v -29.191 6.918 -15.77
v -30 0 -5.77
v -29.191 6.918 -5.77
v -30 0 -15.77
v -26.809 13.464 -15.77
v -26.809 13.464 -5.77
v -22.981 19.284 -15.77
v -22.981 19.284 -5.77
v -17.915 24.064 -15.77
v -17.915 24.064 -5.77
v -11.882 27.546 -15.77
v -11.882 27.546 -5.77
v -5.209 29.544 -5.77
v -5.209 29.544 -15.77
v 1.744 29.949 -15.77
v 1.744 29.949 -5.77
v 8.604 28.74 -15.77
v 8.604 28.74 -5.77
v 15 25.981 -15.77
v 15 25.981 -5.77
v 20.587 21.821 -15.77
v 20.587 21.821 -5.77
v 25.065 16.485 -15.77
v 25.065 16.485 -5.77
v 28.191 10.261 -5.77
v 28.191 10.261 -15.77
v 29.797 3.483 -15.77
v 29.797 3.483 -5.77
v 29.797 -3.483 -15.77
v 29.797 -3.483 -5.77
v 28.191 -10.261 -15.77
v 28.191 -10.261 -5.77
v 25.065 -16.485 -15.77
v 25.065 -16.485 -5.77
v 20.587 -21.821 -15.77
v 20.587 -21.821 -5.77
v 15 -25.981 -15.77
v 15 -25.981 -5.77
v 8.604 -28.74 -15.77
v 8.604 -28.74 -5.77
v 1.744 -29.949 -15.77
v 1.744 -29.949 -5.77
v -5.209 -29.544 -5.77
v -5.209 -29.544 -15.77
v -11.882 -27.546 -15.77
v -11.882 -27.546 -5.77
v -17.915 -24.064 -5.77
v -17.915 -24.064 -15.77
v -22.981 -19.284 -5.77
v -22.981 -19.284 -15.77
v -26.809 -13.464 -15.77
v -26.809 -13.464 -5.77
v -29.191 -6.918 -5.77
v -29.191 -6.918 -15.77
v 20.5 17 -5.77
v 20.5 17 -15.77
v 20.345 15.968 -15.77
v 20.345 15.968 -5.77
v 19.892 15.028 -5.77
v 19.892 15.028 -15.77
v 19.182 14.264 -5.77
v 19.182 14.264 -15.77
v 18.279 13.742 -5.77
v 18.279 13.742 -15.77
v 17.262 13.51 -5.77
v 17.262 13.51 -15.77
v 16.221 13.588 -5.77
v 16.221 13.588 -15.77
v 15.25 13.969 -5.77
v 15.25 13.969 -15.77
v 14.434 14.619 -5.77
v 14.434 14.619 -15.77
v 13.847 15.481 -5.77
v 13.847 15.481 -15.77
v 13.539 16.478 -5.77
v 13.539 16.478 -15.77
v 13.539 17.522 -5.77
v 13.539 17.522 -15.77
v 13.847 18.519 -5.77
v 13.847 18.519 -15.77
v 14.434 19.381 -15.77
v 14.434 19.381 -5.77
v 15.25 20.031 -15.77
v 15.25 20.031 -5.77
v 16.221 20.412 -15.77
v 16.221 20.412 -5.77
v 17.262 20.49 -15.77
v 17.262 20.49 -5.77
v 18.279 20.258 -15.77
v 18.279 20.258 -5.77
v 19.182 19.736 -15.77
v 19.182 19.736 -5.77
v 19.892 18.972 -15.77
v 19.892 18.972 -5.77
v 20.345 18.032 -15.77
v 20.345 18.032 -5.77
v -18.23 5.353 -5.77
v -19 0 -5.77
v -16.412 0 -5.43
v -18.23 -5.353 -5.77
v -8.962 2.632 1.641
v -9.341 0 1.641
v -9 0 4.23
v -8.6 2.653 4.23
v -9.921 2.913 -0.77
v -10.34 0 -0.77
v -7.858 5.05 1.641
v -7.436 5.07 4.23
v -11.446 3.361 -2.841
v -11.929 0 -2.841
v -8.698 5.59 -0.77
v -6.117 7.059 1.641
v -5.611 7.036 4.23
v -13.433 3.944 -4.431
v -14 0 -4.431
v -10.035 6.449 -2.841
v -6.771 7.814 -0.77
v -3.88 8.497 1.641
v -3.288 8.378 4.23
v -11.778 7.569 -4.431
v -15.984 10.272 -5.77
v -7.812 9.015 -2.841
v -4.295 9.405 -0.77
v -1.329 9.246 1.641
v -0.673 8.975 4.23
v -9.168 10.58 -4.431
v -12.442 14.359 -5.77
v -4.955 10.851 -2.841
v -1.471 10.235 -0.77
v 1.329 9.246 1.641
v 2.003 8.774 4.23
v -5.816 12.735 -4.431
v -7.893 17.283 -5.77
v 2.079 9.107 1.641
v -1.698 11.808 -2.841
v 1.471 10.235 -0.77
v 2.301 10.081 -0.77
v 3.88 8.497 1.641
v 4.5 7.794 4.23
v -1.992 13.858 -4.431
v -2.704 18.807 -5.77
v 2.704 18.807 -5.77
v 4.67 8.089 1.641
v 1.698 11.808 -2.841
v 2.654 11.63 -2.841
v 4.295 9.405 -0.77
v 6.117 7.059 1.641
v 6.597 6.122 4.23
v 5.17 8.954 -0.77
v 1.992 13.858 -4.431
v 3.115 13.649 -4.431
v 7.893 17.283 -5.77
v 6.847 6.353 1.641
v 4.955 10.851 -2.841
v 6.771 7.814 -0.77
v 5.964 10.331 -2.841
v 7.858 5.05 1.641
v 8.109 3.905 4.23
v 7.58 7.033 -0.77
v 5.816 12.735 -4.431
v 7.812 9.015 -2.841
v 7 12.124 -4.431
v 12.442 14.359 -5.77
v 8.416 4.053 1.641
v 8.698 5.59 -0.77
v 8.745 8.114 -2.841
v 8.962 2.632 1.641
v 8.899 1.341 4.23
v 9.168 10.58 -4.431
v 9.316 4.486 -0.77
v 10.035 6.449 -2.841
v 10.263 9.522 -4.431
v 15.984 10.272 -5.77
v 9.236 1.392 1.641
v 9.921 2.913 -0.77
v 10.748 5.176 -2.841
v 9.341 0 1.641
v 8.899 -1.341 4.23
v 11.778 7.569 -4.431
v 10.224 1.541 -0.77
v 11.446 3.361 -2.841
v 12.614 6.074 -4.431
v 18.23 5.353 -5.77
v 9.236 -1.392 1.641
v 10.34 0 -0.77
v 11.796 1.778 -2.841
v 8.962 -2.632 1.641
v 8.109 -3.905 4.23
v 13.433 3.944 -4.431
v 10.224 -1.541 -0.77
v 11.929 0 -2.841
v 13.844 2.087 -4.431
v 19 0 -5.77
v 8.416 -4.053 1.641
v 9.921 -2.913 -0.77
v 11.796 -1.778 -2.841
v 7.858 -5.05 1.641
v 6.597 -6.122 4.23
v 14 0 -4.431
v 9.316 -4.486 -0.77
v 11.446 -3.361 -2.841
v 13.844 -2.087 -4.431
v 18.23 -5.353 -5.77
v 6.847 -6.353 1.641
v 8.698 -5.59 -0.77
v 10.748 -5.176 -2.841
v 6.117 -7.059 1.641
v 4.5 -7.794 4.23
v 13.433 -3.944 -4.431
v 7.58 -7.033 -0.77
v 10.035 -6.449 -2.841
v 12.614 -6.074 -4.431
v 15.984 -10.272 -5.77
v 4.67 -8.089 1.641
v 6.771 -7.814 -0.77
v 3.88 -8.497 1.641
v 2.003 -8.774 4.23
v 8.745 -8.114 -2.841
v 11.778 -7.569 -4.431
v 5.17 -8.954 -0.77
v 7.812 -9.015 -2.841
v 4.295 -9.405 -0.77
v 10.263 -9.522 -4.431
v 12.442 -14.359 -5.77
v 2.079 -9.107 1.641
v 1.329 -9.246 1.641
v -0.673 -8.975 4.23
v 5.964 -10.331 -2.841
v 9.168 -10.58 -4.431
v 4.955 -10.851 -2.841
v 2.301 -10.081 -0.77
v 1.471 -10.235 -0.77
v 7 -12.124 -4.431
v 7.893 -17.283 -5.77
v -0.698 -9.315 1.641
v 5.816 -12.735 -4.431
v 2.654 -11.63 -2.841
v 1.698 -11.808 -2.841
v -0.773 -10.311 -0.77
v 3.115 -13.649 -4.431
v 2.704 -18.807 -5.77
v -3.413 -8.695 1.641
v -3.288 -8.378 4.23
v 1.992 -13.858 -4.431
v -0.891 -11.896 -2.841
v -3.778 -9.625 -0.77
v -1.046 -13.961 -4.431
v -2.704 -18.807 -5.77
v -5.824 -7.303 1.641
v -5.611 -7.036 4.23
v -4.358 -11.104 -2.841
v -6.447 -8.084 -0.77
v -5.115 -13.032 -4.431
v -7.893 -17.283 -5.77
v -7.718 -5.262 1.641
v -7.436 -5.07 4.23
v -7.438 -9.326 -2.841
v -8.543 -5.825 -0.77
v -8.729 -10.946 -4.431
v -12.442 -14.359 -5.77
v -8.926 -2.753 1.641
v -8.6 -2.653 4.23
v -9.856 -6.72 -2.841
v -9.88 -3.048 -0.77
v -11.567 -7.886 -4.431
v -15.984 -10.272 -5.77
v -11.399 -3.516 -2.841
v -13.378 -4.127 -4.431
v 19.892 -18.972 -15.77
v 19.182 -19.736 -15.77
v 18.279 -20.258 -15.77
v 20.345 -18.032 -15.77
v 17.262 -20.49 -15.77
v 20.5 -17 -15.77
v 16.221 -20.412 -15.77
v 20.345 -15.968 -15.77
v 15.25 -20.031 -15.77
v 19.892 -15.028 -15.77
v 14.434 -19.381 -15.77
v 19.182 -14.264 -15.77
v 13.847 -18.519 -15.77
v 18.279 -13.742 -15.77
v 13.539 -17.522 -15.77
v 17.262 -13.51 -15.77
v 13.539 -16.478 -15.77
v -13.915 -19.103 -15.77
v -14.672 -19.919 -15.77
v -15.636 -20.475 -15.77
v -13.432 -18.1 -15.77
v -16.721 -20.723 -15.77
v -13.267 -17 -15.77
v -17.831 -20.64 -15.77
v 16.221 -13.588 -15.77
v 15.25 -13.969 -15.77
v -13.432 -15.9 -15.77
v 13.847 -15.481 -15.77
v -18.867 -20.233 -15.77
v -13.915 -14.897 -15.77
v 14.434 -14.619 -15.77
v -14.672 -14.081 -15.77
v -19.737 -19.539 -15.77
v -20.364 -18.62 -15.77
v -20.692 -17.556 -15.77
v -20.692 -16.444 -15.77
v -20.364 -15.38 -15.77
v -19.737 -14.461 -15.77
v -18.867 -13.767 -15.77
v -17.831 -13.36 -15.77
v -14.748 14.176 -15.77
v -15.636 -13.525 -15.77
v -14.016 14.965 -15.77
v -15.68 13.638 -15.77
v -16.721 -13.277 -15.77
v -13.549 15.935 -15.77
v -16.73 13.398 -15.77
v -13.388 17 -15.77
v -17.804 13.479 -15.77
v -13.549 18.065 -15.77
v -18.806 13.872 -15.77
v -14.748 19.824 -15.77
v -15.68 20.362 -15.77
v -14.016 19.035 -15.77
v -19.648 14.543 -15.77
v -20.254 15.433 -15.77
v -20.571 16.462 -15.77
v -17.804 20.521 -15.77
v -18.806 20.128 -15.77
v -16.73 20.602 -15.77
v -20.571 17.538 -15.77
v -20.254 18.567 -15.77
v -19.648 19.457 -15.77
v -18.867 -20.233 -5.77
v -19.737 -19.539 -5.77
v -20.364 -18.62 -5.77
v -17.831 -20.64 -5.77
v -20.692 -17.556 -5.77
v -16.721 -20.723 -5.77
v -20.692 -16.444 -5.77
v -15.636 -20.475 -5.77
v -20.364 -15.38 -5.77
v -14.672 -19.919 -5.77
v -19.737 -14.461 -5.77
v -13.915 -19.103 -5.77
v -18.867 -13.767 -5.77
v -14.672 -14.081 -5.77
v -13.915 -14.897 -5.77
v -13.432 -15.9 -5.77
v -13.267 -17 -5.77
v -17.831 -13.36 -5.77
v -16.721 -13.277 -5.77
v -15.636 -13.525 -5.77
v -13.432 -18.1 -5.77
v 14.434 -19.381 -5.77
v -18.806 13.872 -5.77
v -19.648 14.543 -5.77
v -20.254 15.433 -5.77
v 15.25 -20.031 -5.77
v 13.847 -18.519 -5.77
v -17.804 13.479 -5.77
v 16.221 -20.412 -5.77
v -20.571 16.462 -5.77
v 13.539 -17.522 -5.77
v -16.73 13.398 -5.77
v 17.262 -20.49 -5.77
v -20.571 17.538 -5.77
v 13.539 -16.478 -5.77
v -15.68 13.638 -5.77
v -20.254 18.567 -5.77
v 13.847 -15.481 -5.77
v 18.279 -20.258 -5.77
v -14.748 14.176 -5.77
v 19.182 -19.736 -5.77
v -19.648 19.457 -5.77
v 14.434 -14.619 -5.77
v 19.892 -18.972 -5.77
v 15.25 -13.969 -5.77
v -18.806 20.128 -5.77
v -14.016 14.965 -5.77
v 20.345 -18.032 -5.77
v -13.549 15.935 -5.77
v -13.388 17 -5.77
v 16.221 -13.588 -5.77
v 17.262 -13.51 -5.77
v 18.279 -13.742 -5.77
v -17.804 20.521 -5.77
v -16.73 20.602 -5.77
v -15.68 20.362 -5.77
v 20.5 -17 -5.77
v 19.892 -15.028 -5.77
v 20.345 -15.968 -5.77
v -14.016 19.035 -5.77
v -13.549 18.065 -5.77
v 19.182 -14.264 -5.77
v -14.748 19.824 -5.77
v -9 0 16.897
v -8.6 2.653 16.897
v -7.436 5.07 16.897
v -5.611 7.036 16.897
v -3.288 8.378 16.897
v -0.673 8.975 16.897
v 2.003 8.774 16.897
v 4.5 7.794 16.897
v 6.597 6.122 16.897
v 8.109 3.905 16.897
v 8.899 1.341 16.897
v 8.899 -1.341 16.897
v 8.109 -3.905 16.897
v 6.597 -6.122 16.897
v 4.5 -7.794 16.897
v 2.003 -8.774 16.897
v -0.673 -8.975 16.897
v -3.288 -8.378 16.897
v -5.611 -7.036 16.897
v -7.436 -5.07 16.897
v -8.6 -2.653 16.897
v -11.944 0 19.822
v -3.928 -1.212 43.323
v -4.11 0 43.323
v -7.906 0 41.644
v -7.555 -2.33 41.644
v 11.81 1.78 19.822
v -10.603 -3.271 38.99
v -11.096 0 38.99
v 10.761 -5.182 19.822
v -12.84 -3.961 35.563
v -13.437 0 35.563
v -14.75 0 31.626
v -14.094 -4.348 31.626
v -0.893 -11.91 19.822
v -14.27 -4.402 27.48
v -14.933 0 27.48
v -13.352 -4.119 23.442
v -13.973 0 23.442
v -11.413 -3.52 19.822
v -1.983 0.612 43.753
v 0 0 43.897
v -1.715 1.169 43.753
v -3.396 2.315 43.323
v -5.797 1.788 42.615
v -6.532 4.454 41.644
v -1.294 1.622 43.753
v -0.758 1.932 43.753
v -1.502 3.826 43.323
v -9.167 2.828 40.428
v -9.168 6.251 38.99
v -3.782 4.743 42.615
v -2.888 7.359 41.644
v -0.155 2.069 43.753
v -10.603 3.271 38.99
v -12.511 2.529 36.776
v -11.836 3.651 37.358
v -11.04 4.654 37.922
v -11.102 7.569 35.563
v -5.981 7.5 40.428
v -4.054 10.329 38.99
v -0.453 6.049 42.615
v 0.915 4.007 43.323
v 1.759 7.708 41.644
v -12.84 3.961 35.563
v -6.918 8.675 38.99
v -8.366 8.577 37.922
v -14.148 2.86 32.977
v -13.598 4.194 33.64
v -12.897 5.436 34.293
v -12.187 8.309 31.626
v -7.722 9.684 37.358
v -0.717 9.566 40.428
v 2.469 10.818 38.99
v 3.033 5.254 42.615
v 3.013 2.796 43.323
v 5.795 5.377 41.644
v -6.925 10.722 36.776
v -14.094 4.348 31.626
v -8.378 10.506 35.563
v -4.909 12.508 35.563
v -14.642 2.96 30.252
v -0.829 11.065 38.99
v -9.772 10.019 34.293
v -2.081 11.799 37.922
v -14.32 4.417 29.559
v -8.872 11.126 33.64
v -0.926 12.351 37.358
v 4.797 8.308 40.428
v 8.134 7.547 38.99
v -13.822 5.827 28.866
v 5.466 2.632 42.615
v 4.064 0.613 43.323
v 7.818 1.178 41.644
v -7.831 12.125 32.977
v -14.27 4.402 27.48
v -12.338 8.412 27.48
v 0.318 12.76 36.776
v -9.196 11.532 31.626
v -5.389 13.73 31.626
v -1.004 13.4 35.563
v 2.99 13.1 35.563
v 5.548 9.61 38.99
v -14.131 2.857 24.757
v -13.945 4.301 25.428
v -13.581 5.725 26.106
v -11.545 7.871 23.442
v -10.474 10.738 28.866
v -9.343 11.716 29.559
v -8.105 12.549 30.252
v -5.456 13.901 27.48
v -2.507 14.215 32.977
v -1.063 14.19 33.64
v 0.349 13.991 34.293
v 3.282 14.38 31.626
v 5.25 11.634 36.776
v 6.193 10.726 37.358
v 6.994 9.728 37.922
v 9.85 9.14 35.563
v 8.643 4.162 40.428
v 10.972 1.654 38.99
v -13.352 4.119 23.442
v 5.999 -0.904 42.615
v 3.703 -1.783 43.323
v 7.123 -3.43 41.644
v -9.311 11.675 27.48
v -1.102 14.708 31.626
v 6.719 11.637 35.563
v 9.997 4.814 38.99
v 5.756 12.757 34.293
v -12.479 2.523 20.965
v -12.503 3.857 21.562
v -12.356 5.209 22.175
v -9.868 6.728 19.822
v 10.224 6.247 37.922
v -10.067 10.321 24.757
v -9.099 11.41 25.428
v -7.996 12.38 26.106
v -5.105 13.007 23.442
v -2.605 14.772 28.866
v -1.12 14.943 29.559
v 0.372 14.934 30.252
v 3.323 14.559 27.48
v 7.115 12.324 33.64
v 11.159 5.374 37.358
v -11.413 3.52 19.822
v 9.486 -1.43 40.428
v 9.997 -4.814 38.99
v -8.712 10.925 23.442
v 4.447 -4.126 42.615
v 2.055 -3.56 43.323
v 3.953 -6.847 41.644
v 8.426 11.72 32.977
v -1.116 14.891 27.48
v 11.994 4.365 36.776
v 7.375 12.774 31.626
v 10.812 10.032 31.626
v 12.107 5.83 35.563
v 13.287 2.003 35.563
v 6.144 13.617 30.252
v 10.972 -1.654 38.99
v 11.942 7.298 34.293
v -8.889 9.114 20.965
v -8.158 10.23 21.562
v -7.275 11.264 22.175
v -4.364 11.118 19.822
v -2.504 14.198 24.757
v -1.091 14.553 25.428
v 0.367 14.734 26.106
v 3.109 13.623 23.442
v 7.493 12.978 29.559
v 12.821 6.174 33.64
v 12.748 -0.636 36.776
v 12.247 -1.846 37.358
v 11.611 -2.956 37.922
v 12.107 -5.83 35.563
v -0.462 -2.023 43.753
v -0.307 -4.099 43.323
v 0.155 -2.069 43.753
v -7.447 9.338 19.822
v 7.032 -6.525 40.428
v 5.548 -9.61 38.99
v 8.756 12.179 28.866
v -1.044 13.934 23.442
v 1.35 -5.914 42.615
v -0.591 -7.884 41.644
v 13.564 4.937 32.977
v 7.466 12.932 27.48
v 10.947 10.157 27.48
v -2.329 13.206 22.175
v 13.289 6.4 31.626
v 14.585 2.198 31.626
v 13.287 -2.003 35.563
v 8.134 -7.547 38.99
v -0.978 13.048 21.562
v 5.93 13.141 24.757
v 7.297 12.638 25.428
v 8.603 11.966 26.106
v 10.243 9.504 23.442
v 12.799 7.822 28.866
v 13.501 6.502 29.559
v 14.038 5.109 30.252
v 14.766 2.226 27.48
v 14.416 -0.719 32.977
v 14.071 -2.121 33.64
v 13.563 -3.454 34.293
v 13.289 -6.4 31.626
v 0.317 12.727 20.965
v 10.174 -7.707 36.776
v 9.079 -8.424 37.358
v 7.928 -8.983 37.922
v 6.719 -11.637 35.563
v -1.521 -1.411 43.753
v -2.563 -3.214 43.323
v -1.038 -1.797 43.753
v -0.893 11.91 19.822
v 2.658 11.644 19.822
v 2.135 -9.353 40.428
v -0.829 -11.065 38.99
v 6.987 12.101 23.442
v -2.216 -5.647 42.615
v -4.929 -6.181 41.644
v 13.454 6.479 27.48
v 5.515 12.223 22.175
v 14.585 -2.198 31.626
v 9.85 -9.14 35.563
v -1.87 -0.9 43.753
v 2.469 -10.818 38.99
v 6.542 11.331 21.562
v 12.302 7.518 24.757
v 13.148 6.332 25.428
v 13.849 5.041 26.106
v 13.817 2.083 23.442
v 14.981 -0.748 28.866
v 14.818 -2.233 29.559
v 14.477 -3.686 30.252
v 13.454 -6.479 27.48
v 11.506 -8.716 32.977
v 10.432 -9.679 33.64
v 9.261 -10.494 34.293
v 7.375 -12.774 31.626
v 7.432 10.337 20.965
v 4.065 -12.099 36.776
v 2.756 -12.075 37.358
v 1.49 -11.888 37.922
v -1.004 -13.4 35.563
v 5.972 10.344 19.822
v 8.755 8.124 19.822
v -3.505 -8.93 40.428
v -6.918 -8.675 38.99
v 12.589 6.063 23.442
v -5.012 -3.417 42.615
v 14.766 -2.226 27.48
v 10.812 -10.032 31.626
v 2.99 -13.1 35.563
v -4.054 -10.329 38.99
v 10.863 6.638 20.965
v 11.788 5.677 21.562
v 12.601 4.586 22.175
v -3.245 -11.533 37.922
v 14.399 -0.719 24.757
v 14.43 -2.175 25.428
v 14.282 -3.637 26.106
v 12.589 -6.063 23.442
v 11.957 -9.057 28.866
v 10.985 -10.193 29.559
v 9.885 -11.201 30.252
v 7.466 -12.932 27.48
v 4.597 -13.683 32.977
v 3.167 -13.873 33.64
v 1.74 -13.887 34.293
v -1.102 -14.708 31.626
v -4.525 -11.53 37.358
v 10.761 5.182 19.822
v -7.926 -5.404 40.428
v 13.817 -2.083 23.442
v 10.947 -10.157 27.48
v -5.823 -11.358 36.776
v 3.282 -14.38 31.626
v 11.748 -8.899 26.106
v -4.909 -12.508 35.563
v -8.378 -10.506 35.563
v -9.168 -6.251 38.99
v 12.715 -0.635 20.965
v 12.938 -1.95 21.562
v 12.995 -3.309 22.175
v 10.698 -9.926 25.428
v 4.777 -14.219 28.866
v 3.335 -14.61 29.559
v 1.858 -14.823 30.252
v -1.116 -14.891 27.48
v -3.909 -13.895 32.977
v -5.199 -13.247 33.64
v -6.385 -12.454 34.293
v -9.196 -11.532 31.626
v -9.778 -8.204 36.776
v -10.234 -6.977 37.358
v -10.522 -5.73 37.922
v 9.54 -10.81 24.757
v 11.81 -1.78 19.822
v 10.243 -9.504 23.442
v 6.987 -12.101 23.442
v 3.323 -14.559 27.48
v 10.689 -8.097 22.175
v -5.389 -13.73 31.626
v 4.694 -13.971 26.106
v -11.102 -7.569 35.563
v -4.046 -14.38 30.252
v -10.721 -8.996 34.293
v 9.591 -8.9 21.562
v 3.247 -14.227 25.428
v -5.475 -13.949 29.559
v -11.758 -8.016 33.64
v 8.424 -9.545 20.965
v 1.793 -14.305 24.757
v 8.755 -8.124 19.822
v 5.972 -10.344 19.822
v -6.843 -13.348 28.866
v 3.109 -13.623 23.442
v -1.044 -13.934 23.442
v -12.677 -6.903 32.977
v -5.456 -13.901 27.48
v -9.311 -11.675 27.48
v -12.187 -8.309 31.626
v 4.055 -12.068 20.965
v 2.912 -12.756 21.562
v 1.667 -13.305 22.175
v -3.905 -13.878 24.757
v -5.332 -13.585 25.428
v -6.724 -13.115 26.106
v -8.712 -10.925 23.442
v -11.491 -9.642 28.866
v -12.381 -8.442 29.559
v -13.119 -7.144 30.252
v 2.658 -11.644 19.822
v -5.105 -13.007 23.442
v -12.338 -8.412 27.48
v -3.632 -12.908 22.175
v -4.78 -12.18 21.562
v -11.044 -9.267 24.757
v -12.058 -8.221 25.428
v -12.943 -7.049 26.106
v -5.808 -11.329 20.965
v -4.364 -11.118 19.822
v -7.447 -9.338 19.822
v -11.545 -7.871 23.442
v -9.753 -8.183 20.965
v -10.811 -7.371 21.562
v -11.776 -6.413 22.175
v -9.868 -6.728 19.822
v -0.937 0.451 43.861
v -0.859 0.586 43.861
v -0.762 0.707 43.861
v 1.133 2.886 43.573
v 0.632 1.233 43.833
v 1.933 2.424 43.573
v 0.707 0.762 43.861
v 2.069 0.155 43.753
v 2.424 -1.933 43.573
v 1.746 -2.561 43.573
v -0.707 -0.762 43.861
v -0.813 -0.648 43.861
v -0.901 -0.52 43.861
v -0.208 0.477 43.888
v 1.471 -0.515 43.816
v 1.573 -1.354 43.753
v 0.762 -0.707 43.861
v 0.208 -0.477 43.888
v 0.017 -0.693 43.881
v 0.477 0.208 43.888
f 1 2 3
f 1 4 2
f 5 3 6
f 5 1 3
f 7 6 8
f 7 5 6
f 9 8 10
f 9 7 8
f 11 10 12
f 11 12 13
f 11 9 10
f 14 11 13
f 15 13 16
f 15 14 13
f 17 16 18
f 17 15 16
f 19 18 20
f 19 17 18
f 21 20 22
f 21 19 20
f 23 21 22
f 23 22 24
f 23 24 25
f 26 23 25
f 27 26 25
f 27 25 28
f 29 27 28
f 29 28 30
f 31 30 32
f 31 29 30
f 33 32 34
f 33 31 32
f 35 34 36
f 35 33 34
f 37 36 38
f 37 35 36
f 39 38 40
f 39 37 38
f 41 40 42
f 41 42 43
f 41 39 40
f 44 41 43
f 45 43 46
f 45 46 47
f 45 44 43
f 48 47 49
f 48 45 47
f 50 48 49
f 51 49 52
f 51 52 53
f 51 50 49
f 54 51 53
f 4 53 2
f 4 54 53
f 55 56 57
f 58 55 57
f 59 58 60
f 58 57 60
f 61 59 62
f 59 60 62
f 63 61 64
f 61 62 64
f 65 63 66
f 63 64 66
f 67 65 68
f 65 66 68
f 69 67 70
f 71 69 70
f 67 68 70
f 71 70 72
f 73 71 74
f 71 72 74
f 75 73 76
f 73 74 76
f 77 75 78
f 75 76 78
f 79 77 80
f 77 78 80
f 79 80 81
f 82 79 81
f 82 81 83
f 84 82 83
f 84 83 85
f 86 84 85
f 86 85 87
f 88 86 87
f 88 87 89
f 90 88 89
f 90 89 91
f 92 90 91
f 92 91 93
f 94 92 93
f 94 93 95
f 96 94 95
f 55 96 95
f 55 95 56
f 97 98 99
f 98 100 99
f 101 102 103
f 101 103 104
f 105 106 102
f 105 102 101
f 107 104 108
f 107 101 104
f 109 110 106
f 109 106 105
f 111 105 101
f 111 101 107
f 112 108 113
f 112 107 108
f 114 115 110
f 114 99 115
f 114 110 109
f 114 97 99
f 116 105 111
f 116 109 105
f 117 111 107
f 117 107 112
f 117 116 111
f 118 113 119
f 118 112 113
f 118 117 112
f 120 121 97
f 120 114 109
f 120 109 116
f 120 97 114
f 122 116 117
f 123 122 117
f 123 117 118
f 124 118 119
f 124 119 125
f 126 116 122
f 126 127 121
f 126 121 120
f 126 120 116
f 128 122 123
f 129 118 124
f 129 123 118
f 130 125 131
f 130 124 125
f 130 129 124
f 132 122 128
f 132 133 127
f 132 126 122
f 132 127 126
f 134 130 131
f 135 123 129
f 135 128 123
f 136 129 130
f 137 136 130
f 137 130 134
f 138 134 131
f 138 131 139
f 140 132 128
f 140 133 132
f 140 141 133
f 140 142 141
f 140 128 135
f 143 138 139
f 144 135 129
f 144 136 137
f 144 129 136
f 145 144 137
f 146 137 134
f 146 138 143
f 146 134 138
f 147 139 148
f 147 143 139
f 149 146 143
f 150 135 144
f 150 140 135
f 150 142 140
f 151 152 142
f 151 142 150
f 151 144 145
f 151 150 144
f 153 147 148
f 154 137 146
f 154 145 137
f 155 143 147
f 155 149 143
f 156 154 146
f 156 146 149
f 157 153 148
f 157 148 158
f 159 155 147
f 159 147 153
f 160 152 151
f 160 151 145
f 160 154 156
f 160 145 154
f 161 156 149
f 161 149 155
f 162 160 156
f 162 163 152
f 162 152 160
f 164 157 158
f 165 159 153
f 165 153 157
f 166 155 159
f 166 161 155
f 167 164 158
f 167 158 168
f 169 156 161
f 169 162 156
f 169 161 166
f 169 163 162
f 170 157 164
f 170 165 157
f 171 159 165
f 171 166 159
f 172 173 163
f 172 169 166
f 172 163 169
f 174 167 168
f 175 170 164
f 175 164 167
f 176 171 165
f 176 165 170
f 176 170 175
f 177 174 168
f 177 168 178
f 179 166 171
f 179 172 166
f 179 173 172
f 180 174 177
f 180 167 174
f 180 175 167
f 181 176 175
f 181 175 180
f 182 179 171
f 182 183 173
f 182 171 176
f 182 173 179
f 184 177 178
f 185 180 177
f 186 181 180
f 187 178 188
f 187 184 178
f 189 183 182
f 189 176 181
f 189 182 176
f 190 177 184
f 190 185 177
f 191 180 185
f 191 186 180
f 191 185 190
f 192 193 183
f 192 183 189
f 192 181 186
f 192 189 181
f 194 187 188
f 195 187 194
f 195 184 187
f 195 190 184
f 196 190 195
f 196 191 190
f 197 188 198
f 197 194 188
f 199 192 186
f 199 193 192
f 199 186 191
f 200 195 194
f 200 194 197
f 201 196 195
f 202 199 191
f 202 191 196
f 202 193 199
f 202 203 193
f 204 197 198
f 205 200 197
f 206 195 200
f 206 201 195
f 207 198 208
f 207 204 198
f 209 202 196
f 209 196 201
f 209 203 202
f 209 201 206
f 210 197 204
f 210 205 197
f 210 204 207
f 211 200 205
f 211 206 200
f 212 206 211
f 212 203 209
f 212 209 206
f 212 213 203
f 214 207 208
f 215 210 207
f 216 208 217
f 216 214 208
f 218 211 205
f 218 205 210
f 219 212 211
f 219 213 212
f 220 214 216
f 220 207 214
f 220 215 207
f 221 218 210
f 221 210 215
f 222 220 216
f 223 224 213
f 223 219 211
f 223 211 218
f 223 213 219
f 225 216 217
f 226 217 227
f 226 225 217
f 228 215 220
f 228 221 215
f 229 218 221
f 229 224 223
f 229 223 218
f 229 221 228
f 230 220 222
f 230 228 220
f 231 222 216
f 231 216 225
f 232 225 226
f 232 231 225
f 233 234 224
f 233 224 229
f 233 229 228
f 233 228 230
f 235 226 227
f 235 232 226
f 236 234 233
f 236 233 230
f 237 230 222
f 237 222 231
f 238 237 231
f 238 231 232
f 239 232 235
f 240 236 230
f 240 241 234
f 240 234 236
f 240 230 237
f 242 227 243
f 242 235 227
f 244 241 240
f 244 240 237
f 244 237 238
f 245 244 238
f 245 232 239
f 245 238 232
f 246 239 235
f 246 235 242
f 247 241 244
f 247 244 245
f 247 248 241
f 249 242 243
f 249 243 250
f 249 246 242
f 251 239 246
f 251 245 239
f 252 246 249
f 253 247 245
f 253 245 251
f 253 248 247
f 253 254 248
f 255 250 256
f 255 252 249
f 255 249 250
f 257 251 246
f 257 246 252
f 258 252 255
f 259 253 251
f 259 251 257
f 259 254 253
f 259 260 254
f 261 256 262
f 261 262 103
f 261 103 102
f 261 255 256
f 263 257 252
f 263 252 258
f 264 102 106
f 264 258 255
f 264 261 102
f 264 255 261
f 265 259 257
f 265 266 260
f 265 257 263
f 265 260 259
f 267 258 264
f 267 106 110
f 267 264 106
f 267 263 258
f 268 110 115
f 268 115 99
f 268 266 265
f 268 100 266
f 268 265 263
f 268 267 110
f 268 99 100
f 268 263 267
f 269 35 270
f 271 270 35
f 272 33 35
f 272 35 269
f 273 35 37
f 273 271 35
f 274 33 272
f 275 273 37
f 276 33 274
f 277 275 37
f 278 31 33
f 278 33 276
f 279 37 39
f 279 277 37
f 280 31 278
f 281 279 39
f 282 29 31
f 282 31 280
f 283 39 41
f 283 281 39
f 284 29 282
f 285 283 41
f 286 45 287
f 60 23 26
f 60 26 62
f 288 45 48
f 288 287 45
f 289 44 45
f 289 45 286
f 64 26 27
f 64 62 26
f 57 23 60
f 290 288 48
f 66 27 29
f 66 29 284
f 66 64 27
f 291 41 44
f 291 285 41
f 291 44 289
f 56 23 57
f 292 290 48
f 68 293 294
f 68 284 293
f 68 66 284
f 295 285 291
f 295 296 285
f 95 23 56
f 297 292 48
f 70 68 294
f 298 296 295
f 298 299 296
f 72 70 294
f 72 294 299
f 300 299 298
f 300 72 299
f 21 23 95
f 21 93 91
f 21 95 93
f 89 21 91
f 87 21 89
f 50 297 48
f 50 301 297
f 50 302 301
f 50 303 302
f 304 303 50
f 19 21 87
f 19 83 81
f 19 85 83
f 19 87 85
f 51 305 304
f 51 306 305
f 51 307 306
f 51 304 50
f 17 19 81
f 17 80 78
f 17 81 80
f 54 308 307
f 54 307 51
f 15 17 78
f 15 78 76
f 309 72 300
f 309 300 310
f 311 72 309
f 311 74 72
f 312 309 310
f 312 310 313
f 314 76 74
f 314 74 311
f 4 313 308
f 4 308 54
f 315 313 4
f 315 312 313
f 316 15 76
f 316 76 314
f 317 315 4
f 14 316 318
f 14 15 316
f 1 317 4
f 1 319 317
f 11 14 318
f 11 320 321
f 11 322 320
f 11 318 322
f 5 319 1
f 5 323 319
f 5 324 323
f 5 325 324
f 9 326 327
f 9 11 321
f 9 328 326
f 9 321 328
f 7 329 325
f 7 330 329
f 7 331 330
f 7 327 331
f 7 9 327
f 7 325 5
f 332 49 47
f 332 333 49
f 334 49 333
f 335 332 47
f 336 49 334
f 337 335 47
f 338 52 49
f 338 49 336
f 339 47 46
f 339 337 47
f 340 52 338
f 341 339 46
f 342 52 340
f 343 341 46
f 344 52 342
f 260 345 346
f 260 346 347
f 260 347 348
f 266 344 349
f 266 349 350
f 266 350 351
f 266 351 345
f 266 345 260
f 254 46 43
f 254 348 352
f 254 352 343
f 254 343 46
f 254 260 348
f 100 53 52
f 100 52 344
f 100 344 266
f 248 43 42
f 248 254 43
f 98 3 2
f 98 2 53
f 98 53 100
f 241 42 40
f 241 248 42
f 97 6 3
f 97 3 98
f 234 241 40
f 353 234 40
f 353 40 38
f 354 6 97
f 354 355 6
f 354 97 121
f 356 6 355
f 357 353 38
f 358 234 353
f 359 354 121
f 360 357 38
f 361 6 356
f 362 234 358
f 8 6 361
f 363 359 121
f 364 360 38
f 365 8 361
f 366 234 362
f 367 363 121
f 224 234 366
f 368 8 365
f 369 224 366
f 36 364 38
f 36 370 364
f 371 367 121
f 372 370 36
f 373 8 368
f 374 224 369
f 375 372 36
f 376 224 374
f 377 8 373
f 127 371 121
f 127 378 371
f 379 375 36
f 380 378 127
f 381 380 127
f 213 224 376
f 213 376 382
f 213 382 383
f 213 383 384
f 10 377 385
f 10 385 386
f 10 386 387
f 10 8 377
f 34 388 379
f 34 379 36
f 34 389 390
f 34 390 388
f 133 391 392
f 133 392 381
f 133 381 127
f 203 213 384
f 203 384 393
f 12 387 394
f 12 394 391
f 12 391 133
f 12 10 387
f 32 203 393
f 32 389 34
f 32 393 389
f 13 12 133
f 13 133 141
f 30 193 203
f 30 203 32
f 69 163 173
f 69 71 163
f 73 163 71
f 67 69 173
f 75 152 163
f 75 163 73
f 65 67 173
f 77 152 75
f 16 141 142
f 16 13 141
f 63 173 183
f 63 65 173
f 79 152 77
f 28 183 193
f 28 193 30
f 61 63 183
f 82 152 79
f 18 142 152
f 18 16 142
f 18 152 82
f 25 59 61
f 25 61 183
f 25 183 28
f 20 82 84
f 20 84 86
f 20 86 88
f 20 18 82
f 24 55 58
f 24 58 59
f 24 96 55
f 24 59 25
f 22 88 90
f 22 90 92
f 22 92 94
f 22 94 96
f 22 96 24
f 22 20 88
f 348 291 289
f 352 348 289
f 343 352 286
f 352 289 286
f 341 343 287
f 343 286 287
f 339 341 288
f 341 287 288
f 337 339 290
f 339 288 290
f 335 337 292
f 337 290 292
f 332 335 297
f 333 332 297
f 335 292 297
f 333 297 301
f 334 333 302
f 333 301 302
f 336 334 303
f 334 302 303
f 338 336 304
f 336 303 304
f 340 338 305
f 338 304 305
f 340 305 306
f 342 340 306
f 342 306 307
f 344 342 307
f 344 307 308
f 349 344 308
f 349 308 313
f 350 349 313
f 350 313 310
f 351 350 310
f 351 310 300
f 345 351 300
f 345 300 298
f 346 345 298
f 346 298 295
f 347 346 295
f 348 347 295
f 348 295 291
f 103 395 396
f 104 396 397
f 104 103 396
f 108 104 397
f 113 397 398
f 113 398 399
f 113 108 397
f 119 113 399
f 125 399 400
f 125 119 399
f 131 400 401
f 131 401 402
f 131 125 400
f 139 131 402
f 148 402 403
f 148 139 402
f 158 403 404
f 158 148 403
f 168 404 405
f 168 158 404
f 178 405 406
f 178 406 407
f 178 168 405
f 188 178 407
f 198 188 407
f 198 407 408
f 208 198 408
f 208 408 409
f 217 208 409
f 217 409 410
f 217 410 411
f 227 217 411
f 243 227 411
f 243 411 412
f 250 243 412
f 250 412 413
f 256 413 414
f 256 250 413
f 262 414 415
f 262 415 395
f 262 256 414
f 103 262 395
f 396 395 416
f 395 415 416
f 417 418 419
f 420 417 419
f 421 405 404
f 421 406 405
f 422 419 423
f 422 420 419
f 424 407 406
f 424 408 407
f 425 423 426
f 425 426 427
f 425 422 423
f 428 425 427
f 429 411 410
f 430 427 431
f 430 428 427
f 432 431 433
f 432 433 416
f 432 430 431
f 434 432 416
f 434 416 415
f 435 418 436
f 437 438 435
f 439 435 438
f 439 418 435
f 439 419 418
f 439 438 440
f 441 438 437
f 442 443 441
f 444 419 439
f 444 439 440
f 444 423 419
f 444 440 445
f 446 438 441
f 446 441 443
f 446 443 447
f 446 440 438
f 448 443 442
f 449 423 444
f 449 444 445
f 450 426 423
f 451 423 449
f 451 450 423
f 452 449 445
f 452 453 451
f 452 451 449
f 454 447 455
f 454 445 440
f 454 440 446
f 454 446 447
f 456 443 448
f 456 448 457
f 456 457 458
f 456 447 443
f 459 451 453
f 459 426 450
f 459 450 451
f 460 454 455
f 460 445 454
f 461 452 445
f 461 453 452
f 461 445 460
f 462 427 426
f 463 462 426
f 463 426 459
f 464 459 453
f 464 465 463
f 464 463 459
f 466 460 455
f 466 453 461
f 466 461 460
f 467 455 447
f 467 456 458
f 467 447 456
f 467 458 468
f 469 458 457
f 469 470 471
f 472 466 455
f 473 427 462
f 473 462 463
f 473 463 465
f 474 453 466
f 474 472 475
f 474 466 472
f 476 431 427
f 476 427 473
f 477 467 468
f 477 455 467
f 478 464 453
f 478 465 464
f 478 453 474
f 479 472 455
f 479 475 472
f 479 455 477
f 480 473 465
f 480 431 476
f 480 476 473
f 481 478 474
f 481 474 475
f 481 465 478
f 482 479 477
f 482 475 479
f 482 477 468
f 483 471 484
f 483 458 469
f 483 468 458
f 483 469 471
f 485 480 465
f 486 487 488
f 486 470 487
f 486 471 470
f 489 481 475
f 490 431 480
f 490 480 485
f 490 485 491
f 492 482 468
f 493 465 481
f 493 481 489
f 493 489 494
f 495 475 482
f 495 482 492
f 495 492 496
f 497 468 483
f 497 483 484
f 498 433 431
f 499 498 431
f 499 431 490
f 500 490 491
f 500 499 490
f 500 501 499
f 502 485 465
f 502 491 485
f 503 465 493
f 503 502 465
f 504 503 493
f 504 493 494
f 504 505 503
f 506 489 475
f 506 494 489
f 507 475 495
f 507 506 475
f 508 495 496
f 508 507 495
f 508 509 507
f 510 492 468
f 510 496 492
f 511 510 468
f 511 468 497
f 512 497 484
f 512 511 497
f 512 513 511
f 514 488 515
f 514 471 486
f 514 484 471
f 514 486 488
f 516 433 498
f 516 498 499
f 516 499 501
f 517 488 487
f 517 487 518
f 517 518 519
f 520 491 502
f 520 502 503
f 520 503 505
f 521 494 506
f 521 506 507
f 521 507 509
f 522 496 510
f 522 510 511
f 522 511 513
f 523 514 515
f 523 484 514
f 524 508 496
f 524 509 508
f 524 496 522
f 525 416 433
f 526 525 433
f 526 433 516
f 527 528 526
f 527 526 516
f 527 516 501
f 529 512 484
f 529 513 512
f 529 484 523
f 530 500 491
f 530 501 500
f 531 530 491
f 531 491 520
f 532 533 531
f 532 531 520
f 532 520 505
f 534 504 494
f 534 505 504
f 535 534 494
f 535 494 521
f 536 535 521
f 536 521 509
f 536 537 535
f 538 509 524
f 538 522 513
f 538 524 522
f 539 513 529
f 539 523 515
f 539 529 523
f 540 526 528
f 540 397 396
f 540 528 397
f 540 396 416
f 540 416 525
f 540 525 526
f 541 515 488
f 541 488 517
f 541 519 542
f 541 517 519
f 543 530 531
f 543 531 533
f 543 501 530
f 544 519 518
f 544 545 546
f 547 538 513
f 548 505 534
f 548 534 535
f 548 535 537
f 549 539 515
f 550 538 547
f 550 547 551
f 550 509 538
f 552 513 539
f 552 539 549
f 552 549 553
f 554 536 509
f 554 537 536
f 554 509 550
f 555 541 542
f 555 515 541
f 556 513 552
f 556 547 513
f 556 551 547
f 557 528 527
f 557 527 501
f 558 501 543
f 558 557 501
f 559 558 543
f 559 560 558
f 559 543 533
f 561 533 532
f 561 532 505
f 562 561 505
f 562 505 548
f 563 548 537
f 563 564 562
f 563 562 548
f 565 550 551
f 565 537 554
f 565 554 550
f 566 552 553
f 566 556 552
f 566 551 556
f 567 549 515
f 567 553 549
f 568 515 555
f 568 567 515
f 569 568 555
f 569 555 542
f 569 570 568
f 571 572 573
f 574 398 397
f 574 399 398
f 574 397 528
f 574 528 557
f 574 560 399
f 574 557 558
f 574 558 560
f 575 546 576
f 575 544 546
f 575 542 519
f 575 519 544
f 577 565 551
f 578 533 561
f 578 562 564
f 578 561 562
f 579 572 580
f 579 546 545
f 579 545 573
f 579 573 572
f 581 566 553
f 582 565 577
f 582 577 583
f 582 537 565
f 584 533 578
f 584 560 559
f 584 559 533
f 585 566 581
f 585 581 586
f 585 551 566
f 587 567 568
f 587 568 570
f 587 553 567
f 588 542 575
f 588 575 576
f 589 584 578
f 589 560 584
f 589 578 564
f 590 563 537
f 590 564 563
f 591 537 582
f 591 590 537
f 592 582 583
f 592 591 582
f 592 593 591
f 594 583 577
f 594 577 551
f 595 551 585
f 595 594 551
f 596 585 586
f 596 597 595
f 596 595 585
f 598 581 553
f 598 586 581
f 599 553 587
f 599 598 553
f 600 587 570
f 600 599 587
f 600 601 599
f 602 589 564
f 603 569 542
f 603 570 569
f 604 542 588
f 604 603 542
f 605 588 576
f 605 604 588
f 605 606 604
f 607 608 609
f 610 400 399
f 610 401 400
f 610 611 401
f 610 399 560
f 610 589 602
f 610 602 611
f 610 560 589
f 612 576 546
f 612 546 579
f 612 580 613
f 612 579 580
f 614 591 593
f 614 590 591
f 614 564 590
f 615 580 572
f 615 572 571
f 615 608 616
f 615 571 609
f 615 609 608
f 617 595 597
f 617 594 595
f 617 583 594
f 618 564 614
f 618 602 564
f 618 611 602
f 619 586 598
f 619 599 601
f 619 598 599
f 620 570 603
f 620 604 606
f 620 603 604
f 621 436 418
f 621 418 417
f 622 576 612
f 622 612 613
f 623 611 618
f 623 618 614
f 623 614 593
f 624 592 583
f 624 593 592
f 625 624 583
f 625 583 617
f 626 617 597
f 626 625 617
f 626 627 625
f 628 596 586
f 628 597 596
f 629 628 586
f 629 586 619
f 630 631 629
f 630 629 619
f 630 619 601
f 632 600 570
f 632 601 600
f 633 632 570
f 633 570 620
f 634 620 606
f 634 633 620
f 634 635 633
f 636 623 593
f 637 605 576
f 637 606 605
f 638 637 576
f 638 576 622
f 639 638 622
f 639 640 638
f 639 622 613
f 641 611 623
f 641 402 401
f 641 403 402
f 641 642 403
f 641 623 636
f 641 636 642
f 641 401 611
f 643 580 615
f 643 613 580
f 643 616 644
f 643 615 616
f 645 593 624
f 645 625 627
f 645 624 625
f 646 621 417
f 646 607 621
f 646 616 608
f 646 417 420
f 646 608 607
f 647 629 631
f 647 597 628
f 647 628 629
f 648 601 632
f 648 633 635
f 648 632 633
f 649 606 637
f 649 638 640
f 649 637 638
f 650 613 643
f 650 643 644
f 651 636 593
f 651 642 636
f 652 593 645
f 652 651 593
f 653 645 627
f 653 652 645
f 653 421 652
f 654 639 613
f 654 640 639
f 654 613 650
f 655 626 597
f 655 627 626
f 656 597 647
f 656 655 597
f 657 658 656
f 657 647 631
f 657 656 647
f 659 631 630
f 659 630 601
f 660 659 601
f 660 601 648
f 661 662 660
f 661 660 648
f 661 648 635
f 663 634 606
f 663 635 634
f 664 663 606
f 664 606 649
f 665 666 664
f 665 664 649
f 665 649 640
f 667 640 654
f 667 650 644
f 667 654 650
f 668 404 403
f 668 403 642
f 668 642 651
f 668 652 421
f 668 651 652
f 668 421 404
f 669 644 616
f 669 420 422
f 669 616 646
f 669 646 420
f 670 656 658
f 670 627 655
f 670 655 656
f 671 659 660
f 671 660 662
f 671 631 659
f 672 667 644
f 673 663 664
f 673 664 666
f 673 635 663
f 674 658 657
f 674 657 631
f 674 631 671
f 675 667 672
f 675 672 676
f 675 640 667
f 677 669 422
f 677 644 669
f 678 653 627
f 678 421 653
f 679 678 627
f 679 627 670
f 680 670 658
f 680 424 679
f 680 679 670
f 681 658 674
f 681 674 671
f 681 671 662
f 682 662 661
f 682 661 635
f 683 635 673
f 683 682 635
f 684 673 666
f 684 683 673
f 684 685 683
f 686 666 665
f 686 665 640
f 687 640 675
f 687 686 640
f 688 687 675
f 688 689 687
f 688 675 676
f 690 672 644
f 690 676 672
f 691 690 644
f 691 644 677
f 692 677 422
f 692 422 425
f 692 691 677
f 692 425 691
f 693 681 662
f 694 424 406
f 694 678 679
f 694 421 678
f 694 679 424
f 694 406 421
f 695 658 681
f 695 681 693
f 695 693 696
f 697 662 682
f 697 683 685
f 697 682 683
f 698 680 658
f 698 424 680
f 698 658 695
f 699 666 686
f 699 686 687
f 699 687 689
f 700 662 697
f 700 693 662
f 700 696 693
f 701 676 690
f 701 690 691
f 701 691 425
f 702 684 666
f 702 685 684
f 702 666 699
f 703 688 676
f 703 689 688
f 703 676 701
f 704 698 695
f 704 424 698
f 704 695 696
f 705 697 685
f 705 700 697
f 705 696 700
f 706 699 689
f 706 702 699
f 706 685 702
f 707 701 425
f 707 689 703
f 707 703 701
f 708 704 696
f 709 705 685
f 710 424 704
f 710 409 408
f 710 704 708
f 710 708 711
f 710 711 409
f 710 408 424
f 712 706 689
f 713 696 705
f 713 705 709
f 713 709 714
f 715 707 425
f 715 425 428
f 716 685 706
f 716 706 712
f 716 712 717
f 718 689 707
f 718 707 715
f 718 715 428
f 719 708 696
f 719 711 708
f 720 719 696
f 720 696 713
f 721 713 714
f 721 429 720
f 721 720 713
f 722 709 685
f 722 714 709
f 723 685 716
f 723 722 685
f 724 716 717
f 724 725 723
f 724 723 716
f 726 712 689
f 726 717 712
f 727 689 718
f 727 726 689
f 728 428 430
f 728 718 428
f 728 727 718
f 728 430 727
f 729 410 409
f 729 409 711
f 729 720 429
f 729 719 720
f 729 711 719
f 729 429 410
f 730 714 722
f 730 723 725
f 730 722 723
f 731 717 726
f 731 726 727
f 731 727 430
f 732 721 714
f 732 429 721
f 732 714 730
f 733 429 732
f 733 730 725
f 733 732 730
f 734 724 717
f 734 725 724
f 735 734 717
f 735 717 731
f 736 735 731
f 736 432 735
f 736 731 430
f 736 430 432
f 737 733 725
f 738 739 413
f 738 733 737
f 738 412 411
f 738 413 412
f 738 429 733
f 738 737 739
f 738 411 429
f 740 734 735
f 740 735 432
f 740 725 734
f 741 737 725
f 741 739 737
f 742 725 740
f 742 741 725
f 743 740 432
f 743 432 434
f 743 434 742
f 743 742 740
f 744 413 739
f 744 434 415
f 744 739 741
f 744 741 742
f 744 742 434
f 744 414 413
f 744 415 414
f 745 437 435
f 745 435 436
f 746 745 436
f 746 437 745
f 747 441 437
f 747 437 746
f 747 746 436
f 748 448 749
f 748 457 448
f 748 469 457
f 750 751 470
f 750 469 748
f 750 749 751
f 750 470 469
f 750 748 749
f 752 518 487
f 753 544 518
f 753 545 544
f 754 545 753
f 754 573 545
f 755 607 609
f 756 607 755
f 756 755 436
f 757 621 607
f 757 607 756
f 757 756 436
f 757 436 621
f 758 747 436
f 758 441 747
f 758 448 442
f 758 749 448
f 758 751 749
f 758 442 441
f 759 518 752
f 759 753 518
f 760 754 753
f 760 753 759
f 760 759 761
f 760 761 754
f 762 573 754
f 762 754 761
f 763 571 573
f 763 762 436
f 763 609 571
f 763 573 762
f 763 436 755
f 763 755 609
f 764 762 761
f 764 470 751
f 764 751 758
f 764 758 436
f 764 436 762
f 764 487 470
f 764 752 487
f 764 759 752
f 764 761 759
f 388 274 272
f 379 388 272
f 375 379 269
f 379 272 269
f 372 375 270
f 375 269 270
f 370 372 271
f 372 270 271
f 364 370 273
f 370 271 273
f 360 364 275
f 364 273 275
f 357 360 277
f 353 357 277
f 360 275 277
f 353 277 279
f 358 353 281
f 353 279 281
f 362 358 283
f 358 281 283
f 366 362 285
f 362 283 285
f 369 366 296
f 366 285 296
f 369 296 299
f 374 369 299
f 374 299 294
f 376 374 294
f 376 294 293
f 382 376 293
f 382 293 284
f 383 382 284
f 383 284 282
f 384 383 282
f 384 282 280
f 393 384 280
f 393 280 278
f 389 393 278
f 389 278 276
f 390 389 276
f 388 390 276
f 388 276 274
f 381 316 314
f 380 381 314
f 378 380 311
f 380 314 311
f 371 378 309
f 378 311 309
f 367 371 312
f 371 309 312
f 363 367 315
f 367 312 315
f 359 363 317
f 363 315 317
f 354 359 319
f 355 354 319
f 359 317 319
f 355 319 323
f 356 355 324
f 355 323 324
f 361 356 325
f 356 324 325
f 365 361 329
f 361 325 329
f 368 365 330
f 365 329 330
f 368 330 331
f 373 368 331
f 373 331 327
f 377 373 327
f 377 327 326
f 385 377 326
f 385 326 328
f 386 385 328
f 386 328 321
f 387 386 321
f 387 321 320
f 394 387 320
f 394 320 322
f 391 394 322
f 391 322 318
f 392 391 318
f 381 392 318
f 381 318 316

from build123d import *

# Parameters (mm, degrees)
F2_R     = 3.733432
F2_R_2   = 3.5
F2_R_3   = 3.61173
F3_DEPTH = 25
F4_R     = 10


with BuildPart() as f1:
    # F0 (on Front) → F1 (revolve)
    with BuildSketch(Plane.XZ):
        with BuildLine():
            Line((0, 13.896797), (0, 19.229659))
            Line((0, 19.229659), (-9, 19.229659))
            Line((-9, 19.229659), (-9, 16.896797))
            ThreePointArc((-9, 16.896797), (-4.743416, 14.666548), (0, 13.896797))
        make_face()
        with BuildLine():
            Line((-9, 19.229659), (0, 19.229659))
            Line((0, 19.229659), (0, 43.896797))
            ThreePointArc((0, 43.896797), (-14.230249, 33.640214), (-9, 16.896797))
            Line((-9, 16.896797), (-9, 19.229659))
        make_face()
        with BuildLine():
            Line((0, -5.770341), (0, 13.896797))
            ThreePointArc((0, 13.896797), (-4.743416, 14.666548), (-9, 16.896797))
            Line((-9, 16.896797), (-9, -5.770341))
            Line((-9, -5.770341), (0, -5.770341))
        make_face()
        Polygon((0, -13.677974), (0, -5.770341), (-9, -5.770341), (-30, -5.770341), (-30, -15.770341), (0, -15.770341), align=None)
    revolve(axis=Axis((0, 0, 17.993038), (0, 0, -1)))

    # F2 (on face) → F3 (cut)
    with BuildSketch(Plane(origin=(0, 0, -15.770341), x_dir=(1, 0, 0), z_dir=(0, 0, -1))):
        with Locations((-17, 17)):
            Circle(F2_R)
        with Locations((17, 17)):
            Circle(F2_R_2)
        with Locations((-17, -17)):
            Circle(F2_R_3)
        with Locations((17, -17)):
            Circle(F2_R_2)
    extrude(amount=-F3_DEPTH, mode=Mode.SUBTRACT)

    # F4
    f4_edges = [f1.edges().sort_by_distance(p)[0] for p in [
        (9, 0, -5.770341),
    ]]
    fillet(f4_edges, radius=F4_R)


solid = f1.part
